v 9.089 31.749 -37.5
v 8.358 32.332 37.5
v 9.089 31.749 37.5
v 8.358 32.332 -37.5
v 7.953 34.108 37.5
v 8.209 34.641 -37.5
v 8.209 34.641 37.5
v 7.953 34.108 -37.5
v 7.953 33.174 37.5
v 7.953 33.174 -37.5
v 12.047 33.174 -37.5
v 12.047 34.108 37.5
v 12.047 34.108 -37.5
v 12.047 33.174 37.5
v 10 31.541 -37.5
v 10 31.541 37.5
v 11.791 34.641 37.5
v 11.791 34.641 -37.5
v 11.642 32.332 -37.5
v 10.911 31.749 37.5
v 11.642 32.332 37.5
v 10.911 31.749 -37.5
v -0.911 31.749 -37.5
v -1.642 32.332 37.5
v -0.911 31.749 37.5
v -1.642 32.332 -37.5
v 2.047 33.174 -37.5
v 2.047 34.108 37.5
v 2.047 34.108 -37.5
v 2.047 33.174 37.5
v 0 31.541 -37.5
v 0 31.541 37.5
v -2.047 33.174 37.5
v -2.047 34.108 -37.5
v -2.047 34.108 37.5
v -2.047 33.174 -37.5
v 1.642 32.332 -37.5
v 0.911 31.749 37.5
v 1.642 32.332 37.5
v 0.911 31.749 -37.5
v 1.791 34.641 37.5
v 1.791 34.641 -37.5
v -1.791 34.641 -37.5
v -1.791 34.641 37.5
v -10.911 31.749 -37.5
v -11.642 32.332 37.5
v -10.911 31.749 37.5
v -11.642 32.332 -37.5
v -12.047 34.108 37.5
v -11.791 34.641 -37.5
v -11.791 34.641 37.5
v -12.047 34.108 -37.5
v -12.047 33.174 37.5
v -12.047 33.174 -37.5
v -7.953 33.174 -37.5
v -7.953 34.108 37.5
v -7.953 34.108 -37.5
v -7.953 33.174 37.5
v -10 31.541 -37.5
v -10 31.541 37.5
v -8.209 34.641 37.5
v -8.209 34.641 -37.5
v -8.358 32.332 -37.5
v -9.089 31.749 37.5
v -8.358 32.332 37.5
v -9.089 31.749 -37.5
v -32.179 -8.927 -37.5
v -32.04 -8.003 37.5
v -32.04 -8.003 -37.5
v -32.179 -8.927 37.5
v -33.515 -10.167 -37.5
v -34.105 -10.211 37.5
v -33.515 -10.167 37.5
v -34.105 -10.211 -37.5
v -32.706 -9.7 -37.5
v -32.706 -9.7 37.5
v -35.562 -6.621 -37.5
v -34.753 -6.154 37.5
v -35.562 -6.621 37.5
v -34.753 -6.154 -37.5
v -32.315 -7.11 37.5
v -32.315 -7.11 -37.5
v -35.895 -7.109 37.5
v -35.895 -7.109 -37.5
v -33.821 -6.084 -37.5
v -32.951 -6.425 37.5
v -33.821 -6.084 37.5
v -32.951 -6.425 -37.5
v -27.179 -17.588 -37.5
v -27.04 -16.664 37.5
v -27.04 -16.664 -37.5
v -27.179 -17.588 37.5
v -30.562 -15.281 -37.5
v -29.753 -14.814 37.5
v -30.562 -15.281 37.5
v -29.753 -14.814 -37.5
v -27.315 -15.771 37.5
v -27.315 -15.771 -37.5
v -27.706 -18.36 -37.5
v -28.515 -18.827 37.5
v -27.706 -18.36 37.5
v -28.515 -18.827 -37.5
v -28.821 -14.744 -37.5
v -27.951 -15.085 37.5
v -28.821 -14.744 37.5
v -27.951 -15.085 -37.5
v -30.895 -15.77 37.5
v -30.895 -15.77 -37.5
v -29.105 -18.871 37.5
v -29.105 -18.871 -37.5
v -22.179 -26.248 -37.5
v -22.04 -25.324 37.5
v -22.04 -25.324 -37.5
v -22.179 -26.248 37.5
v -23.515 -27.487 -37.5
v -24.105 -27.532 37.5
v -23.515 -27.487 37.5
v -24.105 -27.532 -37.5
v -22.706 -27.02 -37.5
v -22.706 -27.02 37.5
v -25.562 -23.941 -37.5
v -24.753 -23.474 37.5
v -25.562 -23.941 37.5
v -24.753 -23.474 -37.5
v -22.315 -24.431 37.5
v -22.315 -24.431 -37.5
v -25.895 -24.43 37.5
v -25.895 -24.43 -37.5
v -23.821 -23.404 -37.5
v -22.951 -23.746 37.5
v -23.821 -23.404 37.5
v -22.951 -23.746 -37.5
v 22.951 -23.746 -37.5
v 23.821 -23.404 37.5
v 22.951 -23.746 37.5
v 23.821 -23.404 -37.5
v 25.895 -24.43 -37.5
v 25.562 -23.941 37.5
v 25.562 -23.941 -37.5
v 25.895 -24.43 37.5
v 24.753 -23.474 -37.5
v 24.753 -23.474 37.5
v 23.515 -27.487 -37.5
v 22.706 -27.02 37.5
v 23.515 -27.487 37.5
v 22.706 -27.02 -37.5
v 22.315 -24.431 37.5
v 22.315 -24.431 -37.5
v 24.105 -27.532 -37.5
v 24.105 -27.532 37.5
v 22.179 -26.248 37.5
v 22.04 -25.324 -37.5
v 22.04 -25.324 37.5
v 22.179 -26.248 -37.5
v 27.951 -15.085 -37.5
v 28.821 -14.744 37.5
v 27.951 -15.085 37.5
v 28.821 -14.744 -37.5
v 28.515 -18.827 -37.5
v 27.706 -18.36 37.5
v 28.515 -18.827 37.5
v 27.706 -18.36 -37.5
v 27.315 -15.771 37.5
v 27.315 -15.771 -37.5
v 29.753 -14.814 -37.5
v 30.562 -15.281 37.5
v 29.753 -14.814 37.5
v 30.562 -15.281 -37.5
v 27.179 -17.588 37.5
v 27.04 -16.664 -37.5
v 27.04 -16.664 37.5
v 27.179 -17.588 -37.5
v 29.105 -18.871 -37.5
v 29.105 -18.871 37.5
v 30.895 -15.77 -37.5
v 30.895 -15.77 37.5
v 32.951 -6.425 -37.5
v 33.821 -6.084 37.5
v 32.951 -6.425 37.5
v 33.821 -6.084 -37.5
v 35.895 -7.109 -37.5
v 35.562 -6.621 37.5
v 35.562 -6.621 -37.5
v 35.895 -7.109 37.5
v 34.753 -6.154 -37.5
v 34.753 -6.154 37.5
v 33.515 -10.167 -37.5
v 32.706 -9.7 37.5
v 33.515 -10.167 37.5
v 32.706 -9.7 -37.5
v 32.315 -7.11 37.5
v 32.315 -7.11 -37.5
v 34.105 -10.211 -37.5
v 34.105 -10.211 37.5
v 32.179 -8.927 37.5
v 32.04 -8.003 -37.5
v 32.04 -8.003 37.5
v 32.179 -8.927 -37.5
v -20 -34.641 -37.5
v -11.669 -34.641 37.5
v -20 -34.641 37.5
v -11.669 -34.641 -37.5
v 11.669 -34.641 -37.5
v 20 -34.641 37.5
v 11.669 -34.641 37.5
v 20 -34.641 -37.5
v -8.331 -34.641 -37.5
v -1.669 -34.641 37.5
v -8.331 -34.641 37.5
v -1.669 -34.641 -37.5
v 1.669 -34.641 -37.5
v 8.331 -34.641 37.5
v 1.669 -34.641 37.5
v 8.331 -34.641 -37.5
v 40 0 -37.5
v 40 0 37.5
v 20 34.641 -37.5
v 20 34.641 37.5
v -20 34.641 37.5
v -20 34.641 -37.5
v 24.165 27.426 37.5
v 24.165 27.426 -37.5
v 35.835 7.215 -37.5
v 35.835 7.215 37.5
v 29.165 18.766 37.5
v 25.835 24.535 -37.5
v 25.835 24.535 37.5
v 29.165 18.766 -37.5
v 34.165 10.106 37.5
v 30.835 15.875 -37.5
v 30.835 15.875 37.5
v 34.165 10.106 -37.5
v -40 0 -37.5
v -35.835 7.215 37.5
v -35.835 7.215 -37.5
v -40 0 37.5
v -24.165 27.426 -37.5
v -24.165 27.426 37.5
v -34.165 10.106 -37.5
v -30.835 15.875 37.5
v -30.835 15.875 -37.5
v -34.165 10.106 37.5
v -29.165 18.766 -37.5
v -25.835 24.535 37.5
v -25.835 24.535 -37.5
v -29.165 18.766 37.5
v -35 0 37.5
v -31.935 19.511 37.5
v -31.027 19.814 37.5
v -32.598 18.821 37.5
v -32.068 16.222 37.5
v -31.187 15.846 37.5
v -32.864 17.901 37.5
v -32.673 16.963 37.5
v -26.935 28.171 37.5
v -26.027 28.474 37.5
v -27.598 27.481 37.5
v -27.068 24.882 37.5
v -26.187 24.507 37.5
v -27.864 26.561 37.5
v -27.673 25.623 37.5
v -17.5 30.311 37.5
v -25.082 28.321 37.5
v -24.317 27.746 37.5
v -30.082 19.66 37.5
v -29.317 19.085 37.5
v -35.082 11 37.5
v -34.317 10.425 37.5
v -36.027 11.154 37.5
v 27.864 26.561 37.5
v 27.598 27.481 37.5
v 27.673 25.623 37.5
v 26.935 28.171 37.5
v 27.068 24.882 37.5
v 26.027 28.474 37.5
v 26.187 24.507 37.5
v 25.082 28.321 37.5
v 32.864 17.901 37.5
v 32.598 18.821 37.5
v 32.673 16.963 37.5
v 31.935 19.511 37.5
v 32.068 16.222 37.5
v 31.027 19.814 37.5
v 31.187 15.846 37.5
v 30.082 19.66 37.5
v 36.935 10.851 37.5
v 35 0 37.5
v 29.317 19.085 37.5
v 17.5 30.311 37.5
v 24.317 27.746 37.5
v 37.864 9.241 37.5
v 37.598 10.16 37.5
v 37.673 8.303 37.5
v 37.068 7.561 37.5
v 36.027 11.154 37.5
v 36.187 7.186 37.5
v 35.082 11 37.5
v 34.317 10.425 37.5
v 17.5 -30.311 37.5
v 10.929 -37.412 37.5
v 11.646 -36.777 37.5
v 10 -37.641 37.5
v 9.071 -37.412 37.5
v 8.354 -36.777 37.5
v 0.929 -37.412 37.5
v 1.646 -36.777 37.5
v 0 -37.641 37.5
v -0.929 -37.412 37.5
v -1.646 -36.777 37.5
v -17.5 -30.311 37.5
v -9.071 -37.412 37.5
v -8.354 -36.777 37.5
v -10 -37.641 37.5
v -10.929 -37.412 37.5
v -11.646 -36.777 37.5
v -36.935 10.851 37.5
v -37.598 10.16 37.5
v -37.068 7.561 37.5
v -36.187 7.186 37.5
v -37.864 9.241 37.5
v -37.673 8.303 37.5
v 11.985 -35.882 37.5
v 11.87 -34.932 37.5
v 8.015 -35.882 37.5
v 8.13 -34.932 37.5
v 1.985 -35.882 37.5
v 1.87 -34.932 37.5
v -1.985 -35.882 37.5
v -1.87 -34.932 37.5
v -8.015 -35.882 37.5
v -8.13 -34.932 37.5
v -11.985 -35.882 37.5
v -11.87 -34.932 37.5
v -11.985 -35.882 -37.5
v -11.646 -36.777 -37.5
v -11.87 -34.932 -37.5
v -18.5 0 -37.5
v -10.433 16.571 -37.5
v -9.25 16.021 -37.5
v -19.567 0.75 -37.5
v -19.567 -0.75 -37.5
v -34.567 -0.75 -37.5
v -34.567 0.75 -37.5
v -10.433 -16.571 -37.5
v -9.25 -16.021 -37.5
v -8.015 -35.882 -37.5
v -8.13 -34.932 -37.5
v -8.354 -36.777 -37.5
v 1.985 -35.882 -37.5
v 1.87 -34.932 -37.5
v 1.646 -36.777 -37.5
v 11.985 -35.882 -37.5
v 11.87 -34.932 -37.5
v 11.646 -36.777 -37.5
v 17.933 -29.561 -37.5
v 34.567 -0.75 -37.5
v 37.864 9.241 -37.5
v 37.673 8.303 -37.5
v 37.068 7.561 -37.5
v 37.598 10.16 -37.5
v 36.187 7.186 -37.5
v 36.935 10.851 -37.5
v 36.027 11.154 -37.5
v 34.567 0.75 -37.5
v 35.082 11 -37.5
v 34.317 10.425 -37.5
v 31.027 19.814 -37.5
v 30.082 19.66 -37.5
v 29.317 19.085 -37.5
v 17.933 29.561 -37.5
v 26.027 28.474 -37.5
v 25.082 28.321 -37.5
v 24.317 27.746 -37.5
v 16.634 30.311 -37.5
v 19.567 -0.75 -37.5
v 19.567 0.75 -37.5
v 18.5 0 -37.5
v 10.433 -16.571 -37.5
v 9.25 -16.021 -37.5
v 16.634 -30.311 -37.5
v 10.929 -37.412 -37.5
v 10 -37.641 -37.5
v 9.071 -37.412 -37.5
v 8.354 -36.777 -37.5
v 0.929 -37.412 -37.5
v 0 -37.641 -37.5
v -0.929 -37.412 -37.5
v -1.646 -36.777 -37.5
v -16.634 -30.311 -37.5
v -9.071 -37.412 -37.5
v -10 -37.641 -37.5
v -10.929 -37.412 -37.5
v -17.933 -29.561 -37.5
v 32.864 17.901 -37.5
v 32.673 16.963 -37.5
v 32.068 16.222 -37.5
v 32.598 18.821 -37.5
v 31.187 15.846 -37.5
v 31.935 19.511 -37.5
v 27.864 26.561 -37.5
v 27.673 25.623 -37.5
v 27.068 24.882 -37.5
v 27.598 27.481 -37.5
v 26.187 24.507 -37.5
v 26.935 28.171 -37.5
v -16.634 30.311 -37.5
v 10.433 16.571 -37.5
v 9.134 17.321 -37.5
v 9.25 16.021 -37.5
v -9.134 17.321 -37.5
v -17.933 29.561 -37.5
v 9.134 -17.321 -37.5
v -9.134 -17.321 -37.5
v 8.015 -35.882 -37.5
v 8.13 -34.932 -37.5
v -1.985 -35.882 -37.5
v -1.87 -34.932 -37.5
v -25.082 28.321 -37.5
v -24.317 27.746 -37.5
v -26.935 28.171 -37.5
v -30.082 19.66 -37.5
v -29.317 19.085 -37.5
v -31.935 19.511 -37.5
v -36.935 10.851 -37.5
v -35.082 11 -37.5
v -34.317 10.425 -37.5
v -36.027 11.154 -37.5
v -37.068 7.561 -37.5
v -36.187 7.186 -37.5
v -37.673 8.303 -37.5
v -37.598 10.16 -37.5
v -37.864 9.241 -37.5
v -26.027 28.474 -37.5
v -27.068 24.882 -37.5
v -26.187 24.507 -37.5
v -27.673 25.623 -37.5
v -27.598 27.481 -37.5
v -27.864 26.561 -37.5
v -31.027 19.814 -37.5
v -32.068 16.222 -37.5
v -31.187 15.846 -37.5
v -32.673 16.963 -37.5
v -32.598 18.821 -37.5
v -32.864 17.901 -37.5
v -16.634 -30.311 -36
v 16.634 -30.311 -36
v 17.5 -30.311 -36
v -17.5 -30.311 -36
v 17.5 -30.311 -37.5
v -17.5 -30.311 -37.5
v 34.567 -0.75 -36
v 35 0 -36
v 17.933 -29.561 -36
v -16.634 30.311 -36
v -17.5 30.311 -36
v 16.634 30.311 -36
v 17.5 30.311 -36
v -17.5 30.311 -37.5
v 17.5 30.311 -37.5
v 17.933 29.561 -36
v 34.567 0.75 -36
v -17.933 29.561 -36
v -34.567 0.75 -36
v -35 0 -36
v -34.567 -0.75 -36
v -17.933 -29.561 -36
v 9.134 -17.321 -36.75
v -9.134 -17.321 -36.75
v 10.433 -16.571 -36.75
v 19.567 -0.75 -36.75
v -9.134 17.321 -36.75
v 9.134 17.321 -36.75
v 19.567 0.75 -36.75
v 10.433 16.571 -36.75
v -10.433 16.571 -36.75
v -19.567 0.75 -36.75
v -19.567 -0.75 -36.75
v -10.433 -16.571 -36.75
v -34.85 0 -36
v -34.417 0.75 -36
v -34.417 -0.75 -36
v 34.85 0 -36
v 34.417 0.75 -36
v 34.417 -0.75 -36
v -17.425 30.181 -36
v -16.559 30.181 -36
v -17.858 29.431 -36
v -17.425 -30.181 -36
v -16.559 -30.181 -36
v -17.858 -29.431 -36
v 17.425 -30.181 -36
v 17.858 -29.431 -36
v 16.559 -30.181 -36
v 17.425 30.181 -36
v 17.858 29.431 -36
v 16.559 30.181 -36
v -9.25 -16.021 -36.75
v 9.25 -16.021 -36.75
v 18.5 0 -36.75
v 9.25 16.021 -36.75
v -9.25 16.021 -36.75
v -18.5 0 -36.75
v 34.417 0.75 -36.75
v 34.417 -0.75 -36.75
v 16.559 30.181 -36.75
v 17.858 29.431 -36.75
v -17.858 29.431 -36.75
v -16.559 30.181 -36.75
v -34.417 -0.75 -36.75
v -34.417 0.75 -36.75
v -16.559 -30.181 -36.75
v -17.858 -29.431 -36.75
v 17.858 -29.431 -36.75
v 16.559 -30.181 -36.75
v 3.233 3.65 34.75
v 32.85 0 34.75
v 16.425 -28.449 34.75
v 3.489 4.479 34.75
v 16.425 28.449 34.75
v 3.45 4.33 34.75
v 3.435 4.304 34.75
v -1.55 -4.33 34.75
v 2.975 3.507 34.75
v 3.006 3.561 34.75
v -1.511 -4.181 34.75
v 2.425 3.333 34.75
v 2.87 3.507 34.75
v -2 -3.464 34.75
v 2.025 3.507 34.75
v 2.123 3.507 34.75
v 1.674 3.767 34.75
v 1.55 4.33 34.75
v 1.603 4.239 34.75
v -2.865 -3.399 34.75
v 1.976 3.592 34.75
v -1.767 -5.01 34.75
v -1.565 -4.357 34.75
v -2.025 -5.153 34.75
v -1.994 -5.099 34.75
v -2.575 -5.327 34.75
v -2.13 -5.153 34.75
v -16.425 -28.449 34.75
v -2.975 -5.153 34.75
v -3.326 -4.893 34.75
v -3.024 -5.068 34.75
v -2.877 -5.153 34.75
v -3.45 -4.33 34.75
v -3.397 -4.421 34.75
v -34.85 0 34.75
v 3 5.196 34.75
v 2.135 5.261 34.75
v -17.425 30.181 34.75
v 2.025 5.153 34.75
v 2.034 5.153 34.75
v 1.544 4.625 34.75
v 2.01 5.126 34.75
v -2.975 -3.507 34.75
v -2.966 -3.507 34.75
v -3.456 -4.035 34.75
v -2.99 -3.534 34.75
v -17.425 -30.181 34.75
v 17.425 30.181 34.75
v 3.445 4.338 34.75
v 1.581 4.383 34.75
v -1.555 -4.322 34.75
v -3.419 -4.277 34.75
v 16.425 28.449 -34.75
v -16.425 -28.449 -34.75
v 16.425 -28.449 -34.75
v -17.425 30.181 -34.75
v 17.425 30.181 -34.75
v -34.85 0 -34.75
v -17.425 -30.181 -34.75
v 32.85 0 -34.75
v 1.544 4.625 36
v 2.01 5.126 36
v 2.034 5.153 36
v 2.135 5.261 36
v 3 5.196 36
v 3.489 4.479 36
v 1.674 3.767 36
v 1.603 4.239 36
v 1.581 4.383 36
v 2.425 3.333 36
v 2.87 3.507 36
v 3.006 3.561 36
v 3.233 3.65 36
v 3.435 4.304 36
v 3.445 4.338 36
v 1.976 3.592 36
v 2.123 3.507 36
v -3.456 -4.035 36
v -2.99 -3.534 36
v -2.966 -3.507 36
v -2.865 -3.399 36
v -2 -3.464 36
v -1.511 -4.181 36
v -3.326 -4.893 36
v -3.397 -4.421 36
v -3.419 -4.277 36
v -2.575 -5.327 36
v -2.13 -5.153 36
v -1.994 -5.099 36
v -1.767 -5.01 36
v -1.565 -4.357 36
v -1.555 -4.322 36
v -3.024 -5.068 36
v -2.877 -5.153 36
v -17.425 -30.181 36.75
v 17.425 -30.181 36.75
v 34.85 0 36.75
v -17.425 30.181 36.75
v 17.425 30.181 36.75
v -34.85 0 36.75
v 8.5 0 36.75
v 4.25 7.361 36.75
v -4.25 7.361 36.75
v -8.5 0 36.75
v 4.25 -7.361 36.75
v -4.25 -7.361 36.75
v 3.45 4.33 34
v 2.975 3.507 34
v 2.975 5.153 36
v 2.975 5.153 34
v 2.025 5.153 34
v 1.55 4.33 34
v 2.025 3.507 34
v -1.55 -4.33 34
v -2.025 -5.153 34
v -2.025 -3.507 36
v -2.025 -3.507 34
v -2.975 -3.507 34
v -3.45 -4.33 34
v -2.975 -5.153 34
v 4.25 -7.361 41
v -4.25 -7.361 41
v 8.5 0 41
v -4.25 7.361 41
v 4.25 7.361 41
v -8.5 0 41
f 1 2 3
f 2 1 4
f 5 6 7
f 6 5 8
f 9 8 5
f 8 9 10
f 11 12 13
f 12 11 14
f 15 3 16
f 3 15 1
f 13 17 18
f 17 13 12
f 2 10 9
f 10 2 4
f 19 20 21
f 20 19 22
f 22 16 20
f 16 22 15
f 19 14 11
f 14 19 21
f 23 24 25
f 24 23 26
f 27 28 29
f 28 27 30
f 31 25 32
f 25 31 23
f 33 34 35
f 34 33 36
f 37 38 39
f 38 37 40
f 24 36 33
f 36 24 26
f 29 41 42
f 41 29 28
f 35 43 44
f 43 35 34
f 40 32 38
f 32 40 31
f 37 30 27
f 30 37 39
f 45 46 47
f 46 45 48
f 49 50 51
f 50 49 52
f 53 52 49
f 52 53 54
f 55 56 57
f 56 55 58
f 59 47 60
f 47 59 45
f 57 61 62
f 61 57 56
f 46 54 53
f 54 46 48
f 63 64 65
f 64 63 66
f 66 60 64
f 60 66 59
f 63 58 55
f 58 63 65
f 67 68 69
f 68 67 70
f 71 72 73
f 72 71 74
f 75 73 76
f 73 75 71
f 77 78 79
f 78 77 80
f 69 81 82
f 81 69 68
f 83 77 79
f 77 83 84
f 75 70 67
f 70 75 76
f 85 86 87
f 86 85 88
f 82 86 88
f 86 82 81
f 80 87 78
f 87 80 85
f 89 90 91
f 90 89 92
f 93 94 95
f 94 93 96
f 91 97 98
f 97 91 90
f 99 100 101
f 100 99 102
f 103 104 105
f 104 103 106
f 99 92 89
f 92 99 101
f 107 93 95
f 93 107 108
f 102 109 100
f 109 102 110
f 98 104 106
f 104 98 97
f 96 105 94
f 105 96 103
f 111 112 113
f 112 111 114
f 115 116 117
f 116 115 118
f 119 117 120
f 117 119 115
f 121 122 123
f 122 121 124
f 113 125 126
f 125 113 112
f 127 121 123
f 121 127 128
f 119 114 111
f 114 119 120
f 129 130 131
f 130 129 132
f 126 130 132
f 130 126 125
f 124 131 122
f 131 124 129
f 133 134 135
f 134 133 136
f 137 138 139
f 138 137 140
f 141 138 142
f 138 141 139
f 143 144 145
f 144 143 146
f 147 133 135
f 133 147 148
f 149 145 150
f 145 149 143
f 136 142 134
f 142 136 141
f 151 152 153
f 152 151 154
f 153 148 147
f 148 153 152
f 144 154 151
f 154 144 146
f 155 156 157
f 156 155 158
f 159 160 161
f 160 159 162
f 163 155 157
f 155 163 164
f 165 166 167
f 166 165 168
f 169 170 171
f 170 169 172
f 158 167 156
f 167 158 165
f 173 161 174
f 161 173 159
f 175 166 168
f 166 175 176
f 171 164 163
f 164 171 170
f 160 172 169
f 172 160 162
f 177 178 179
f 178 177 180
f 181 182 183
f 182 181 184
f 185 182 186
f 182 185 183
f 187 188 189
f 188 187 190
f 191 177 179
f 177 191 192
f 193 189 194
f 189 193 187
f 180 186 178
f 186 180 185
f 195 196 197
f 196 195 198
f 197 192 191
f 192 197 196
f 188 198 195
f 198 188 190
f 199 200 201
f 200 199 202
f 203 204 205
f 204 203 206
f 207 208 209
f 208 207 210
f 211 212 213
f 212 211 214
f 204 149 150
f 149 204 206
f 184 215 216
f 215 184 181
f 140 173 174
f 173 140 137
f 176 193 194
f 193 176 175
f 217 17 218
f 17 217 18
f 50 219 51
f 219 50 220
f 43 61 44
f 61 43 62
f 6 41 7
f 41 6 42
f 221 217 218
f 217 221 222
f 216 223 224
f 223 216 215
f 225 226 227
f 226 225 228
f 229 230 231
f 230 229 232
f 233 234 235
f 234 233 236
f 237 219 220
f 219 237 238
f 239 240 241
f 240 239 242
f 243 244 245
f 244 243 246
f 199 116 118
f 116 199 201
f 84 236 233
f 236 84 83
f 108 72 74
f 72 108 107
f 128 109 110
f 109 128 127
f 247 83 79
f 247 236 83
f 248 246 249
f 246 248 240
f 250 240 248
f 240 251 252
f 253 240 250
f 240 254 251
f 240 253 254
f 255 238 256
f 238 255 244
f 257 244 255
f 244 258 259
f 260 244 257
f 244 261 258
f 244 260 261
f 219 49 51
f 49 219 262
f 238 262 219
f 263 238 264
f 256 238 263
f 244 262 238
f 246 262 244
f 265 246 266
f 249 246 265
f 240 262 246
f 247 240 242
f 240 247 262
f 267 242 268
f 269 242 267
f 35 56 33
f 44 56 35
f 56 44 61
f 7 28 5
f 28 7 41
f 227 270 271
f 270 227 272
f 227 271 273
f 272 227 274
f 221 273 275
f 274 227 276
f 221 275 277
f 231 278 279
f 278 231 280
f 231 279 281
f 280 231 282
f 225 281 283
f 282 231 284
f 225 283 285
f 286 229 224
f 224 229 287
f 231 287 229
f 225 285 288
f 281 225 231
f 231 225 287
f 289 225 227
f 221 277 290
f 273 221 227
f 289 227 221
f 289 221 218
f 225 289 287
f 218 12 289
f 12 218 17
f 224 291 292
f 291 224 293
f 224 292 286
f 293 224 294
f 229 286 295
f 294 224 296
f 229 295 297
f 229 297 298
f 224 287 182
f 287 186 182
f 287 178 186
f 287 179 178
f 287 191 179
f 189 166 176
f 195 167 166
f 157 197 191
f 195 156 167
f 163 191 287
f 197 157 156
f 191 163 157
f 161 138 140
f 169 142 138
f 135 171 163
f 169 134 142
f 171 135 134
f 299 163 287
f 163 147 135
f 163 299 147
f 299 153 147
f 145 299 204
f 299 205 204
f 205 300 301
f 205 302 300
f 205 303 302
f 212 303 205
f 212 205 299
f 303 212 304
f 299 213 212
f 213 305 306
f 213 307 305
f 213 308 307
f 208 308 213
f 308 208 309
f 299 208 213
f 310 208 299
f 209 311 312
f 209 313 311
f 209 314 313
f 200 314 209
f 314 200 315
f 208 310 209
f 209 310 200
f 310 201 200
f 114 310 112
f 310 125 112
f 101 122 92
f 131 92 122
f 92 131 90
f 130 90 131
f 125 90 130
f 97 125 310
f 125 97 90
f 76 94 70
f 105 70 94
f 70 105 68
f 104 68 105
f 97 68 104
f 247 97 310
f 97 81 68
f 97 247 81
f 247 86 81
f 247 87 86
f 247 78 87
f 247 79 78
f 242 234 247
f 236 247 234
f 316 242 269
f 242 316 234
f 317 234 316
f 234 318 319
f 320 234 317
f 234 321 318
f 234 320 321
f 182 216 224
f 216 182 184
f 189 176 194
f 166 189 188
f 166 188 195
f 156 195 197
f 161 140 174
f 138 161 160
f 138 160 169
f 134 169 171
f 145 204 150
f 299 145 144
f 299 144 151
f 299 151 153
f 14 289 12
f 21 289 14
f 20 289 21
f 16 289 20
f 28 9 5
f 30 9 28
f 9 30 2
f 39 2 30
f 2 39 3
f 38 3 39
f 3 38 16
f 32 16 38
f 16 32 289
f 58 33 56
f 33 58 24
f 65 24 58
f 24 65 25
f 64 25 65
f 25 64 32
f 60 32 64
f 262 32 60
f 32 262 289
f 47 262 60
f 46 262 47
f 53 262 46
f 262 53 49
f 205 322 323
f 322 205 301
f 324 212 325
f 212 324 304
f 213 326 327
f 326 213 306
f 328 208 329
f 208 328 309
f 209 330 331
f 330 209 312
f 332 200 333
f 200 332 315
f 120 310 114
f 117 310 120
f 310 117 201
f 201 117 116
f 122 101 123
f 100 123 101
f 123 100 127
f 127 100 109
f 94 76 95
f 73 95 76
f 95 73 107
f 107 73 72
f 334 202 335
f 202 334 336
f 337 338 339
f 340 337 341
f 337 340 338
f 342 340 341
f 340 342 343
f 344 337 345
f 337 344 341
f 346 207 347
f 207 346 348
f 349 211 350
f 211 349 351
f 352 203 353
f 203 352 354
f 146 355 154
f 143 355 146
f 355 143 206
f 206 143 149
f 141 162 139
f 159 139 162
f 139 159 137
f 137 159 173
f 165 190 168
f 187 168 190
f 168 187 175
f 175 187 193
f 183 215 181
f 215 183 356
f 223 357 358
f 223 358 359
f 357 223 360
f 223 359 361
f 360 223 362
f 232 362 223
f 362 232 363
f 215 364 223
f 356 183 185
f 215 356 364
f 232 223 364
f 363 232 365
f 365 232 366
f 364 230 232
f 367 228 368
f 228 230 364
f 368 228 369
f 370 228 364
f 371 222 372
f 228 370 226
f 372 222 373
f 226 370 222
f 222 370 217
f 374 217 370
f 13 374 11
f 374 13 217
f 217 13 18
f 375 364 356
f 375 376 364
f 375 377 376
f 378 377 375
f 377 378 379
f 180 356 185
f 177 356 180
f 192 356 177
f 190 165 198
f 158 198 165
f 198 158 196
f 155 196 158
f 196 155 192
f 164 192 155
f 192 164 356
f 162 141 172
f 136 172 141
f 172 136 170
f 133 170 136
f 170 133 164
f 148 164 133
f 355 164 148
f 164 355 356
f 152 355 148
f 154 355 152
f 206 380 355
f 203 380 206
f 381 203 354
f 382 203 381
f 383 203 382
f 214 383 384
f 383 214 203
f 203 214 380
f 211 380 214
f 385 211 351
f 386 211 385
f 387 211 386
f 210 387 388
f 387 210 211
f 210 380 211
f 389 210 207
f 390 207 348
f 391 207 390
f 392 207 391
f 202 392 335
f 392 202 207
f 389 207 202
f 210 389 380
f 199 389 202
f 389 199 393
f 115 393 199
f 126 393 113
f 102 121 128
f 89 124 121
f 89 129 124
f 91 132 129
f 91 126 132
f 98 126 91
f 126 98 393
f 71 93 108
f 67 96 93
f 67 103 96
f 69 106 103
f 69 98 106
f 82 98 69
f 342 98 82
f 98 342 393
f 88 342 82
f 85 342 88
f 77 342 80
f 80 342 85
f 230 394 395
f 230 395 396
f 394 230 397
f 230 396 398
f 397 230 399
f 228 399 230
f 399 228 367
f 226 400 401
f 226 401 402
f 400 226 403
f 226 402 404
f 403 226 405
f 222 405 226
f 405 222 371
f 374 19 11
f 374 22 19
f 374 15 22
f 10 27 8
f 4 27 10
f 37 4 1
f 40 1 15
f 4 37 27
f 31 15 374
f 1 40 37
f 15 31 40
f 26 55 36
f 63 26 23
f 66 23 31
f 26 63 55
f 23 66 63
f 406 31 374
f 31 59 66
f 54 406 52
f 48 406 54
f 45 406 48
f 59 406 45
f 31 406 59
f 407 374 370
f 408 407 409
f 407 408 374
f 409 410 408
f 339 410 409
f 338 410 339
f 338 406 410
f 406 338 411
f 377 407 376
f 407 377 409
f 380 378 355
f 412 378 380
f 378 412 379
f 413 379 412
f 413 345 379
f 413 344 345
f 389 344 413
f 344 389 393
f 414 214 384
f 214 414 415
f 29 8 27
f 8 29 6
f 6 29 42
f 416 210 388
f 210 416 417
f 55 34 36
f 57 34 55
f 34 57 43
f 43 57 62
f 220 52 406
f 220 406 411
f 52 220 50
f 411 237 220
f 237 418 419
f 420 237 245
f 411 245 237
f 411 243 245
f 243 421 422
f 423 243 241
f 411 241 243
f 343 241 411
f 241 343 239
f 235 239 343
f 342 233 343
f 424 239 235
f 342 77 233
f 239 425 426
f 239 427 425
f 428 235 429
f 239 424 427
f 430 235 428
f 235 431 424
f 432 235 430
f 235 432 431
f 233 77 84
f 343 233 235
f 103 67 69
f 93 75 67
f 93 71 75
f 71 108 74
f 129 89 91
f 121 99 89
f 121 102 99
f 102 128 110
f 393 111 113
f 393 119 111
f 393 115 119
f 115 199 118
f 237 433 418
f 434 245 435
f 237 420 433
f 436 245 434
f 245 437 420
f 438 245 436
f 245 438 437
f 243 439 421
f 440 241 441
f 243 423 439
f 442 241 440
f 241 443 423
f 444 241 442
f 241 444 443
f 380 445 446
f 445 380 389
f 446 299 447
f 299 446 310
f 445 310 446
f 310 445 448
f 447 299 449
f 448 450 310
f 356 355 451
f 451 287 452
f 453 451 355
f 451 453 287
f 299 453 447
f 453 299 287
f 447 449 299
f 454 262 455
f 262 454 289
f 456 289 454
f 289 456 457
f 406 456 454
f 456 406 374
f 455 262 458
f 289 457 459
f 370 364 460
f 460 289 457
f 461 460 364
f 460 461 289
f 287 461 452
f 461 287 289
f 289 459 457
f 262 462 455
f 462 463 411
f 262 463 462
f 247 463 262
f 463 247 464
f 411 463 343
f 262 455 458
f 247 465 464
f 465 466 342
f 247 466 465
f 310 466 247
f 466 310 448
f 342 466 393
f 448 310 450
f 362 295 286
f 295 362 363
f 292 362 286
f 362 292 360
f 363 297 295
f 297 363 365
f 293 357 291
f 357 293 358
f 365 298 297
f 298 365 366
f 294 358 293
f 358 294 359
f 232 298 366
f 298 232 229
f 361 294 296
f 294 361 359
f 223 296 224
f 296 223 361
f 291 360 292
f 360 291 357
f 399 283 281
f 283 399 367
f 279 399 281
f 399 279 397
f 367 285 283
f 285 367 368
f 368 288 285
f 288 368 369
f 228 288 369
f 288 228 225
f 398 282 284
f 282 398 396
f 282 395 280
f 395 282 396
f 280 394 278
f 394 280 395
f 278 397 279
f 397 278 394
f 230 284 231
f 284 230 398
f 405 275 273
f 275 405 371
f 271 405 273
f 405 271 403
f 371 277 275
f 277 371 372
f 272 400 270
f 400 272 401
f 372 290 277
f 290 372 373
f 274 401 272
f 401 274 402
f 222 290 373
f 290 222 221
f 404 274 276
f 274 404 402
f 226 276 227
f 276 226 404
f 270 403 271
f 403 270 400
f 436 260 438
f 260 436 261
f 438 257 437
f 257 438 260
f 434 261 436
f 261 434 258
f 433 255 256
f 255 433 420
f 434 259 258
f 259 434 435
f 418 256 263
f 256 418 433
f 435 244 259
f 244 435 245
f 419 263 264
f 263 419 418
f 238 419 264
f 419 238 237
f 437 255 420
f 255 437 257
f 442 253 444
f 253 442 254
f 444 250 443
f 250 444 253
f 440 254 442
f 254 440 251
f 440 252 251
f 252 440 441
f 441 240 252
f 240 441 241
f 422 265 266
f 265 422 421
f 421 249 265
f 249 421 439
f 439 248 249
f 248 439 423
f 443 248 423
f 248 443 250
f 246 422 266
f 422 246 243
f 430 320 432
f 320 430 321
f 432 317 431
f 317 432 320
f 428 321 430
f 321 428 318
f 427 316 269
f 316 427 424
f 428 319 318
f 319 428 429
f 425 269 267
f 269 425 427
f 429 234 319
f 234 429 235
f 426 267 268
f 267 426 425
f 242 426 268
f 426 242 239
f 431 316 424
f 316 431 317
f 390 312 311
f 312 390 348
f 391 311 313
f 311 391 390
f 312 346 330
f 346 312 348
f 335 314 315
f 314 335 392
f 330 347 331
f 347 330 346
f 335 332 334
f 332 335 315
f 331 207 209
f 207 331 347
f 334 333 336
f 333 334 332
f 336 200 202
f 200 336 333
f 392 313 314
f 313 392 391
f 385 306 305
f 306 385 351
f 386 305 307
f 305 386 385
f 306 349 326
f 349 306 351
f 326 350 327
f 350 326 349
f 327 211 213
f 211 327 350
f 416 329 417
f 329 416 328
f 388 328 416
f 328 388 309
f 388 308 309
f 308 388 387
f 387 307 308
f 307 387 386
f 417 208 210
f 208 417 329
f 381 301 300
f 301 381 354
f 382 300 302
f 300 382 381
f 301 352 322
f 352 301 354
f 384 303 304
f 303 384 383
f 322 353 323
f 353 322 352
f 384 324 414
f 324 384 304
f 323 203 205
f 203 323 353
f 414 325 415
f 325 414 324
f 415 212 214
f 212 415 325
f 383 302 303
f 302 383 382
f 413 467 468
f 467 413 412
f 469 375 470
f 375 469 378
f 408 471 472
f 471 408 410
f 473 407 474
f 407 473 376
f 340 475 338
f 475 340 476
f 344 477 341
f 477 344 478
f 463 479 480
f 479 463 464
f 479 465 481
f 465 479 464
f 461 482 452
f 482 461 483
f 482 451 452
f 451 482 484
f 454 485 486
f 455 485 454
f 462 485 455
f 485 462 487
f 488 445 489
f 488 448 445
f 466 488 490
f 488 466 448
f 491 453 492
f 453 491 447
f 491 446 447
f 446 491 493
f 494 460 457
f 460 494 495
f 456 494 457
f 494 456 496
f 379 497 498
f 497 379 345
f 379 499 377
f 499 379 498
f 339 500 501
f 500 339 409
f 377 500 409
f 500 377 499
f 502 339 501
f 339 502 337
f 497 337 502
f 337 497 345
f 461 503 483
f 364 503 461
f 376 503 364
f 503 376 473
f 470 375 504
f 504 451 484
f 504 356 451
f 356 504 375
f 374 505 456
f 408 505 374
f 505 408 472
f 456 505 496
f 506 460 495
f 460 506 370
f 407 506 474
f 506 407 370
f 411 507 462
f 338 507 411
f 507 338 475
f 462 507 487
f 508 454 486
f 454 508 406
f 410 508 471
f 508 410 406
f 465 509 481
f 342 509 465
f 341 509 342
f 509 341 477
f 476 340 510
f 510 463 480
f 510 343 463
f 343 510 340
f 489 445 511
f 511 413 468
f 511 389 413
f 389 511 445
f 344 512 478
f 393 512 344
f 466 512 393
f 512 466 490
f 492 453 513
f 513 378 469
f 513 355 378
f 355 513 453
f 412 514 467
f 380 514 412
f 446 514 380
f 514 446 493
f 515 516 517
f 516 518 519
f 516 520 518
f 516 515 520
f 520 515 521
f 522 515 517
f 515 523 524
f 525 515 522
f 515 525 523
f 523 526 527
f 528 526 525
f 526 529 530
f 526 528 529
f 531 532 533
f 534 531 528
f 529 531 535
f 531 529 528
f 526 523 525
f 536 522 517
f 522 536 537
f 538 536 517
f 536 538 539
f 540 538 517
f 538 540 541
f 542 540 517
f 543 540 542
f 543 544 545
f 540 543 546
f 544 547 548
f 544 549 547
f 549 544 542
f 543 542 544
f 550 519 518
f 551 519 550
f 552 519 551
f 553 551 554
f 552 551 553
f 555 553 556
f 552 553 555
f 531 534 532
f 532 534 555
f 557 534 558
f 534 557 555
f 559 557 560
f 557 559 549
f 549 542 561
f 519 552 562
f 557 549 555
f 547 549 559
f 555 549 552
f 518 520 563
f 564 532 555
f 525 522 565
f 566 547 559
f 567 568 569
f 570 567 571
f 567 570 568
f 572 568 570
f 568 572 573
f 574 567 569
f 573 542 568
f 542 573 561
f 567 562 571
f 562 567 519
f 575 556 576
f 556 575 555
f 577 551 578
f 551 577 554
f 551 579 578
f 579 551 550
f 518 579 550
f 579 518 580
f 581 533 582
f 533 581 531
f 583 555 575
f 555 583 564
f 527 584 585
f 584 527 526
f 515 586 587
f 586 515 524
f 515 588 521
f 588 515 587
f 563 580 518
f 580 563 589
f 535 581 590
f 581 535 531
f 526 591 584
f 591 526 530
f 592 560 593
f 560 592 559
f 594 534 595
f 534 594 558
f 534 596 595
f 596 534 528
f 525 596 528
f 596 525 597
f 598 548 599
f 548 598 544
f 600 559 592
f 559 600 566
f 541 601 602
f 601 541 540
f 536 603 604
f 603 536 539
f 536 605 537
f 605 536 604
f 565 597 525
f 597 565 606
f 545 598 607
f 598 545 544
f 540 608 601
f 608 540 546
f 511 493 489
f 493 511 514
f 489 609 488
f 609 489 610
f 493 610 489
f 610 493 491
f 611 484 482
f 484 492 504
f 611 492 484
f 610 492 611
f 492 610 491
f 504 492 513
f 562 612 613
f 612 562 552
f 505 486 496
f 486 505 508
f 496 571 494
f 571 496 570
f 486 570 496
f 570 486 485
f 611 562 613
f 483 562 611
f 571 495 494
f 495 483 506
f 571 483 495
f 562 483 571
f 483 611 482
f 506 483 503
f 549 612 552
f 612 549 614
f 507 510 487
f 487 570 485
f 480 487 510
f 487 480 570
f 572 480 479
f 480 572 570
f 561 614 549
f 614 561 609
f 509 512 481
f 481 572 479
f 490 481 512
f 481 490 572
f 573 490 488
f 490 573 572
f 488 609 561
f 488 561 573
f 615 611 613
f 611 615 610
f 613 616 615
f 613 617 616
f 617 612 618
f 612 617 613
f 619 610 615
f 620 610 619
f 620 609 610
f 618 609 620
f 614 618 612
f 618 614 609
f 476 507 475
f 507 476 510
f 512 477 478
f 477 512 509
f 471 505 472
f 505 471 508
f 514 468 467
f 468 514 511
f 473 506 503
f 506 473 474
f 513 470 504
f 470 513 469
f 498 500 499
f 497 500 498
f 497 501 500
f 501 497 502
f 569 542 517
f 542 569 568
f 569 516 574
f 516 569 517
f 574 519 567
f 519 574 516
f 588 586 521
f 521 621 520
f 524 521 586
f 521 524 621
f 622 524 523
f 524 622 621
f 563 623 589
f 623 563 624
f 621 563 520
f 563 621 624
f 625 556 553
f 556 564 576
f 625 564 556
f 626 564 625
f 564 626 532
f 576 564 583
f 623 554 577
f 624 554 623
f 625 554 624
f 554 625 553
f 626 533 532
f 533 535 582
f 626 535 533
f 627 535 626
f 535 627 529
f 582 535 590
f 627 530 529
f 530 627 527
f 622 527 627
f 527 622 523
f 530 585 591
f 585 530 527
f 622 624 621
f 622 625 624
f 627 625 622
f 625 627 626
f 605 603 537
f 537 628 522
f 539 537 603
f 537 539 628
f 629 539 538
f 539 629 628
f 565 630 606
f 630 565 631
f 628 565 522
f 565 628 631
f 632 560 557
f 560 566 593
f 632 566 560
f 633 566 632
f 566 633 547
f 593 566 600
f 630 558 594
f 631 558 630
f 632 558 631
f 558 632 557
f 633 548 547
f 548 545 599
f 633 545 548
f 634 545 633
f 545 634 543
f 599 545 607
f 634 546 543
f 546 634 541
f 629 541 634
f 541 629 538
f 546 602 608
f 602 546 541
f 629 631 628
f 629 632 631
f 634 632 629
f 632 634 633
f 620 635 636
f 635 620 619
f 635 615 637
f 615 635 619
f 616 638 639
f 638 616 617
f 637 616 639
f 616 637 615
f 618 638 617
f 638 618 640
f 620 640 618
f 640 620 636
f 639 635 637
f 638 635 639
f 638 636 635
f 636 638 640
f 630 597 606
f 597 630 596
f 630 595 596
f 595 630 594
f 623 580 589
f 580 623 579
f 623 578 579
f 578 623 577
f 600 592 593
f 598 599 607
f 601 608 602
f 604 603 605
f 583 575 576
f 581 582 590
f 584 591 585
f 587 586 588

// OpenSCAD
$fs=1;
$fa=1;

//The Number of Sides of the Drawer
numSides=6; //[3,4,5,6,7,8,9,10,11,12,13,14,15]

//Lenght of Each Side
sideLength=40;

//Depth of the Drawer
depth=75;

//Thickness of the Drawer Shell
shellThickness=5;

//Thickness of the Inner Drawer
drawerThickness=2;

//How Much Gap from Shell to Drawer
drawerSlop=.3;

//Select What Item to Show 1:Shell, 2:Drawer, 3:Knob, 4:Full Assembly
thingToShow=4; //[1,2,3,4]

if(thingToShow==1){
Shell(numSides,sideLength,depth,shellThickness);
}

if(thingToShow==2){
color("GREEN")Drawer(numSides,sideLength,depth,shellThickness,drawerThickness);
}

if(thingToShow==3){
Knob(numSides,sideLength,depth,shellThickness,drawerThickness);
}

if(thingToShow==4){
Shell(numSides,sideLength,depth,shellThickness);
color("GREEN")Drawer(numSides,sideLength,depth,shellThickness,drawerThickness);
Knob(numSides,sideLength,depth,shellThickness,drawerThickness);
}


module Shell(numSides=6,sideLength=100,depth=150,thickness=10){
    
    //Vars for Tabs and Grooves and Length Dia
    diameter=sideLength/sin(180/numSides);
    smallRad=diameter/2*cos(180/numSides);
    tabDia=thickness*.8;

    //-----------------The Main Outer Shell with Tabs and Grooves-----------------------------
    difference(){
        cylinder(h=depth,d=diameter,$fn=numSides,center=true);
        cylinder(h=depth+2,d=diameter-2*thickness,$fn=numSides,center=true);
        //cut grooves
        for(angle=[360/numSides:360/numSides*2:359]){
            rotate([0,0,angle])
            for(y=[-sideLength/4:sideLength/4:sideLength/4]){
                difference(){
                    rotate([0,0,180/numSides])
                    translate([smallRad-tabDia/4,y,0])
                    cylinder(h=depth+2,d=tabDia+.2,center=true);}
            }
        }
    }
        //add tabs on ends
        for(angle=[0:360/numSides*2:359]){
        rotate([0,0,angle])
        for(y=[-sideLength/4:sideLength/4:sideLength/4]){
            rotate([0,0,180/numSides])
            translate([smallRad+tabDia/4,y,0])
            cylinder(h=depth,d=tabDia,center=true);
        }
    }

        
    //---------------------------Back of Drawer-------------------------
    backThickness=thickness*.3;
    backDia=diameter*.5;
       
    // Create the center shape
    translate([0,0,-depth/2+backThickness/2]){
        difference(){
            cylinder(h=backThickness,d=backDia,$fn=numSides,center=true);
            cylinder(h=backThickness+2,d=backDia-2*backThickness,$fn=numSides,center=true);
            
        }
    }
    
    //Create the spokes coming out of the corners of center shape
    translate([0,0,-depth/2+backThickness/2])
    difference(){
        for(angle=[0:360/numSides:359]){
            rotate([0,0,angle])
            translate([diameter/4-thickness/2,0,0])
            cube([diameter/2-thickness,backThickness,backThickness],center=true);
        }
        cylinder(h=backThickness+2,d=backDia-2*backThickness,$fn=numSides,center=true);
    }
       
    
}

module Drawer(numSides=6,sideLength=100,depth=150,shellThickness=10,drawerThickness=2){
    
    //Vars for Tabs and Grooves and Length Dia
    diameter=sideLength/sin(180/numSides);
    smallRad=diameter/2*cos(180/numSides);
    tabDia=shellThickness*.4;
    backThickness=shellThickness*.3;
    
    drawerInnerDia=diameter-2*shellThickness-drawerSlop-drawerThickness*2;
    drawerInnerLen=depth-backThickness-drawerThickness*2;
    angleToFlat=90-180/numSides;
    
    pinThick=2;
    pinOffset=5;
    
    difference(){
        cylinder(h=depth-backThickness,d=diameter-2*shellThickness-drawerSlop,$fn=numSides,center=true);
        cylinder(h=drawerInnerLen,d=drawerInnerDia,$fn=numSides,center=true);
        rotate([0,0,angleToFlat]){
            translate([0,drawerInnerDia/2,0])cube([diameter,drawerInnerDia,drawerInnerLen],center=true);
            translate([pinOffset,0,(depth/2-backThickness)])
                cylinder(h=drawerThickness*4,d=pinThick,center=true);
            translate([-pinOffset,0,(depth/2-backThickness)])
                cylinder(h=drawerThickness*4,d=pinThick,center=true);
        }        
    }   
}

module Knob(numSides=6,sideLength=100,depth=150,shellThickness=10,drawerThickness=2){
    diameter=17;
    knobThick=5;
    pinThick=1.9;
    pinOffset=5;
    backThickness=shellThickness*.3;
    angleToFlat=90-180/numSides;
    
    rotate([0,0,angleToFlat]){
    translate([pinOffset,0,(depth/2-backThickness)])
        cylinder(h=drawerThickness*2,d=pinThick,center=true);
    translate([-pinOffset,0,(depth/2-backThickness)])
        cylinder(h=drawerThickness*2,d=pinThick,center=true);
    
     }  
    translate([0,0,(depth/2-backThickness)])
        cylinder(h=knobThick,d=diameter,$fn=numSides,center=false);
    
}
